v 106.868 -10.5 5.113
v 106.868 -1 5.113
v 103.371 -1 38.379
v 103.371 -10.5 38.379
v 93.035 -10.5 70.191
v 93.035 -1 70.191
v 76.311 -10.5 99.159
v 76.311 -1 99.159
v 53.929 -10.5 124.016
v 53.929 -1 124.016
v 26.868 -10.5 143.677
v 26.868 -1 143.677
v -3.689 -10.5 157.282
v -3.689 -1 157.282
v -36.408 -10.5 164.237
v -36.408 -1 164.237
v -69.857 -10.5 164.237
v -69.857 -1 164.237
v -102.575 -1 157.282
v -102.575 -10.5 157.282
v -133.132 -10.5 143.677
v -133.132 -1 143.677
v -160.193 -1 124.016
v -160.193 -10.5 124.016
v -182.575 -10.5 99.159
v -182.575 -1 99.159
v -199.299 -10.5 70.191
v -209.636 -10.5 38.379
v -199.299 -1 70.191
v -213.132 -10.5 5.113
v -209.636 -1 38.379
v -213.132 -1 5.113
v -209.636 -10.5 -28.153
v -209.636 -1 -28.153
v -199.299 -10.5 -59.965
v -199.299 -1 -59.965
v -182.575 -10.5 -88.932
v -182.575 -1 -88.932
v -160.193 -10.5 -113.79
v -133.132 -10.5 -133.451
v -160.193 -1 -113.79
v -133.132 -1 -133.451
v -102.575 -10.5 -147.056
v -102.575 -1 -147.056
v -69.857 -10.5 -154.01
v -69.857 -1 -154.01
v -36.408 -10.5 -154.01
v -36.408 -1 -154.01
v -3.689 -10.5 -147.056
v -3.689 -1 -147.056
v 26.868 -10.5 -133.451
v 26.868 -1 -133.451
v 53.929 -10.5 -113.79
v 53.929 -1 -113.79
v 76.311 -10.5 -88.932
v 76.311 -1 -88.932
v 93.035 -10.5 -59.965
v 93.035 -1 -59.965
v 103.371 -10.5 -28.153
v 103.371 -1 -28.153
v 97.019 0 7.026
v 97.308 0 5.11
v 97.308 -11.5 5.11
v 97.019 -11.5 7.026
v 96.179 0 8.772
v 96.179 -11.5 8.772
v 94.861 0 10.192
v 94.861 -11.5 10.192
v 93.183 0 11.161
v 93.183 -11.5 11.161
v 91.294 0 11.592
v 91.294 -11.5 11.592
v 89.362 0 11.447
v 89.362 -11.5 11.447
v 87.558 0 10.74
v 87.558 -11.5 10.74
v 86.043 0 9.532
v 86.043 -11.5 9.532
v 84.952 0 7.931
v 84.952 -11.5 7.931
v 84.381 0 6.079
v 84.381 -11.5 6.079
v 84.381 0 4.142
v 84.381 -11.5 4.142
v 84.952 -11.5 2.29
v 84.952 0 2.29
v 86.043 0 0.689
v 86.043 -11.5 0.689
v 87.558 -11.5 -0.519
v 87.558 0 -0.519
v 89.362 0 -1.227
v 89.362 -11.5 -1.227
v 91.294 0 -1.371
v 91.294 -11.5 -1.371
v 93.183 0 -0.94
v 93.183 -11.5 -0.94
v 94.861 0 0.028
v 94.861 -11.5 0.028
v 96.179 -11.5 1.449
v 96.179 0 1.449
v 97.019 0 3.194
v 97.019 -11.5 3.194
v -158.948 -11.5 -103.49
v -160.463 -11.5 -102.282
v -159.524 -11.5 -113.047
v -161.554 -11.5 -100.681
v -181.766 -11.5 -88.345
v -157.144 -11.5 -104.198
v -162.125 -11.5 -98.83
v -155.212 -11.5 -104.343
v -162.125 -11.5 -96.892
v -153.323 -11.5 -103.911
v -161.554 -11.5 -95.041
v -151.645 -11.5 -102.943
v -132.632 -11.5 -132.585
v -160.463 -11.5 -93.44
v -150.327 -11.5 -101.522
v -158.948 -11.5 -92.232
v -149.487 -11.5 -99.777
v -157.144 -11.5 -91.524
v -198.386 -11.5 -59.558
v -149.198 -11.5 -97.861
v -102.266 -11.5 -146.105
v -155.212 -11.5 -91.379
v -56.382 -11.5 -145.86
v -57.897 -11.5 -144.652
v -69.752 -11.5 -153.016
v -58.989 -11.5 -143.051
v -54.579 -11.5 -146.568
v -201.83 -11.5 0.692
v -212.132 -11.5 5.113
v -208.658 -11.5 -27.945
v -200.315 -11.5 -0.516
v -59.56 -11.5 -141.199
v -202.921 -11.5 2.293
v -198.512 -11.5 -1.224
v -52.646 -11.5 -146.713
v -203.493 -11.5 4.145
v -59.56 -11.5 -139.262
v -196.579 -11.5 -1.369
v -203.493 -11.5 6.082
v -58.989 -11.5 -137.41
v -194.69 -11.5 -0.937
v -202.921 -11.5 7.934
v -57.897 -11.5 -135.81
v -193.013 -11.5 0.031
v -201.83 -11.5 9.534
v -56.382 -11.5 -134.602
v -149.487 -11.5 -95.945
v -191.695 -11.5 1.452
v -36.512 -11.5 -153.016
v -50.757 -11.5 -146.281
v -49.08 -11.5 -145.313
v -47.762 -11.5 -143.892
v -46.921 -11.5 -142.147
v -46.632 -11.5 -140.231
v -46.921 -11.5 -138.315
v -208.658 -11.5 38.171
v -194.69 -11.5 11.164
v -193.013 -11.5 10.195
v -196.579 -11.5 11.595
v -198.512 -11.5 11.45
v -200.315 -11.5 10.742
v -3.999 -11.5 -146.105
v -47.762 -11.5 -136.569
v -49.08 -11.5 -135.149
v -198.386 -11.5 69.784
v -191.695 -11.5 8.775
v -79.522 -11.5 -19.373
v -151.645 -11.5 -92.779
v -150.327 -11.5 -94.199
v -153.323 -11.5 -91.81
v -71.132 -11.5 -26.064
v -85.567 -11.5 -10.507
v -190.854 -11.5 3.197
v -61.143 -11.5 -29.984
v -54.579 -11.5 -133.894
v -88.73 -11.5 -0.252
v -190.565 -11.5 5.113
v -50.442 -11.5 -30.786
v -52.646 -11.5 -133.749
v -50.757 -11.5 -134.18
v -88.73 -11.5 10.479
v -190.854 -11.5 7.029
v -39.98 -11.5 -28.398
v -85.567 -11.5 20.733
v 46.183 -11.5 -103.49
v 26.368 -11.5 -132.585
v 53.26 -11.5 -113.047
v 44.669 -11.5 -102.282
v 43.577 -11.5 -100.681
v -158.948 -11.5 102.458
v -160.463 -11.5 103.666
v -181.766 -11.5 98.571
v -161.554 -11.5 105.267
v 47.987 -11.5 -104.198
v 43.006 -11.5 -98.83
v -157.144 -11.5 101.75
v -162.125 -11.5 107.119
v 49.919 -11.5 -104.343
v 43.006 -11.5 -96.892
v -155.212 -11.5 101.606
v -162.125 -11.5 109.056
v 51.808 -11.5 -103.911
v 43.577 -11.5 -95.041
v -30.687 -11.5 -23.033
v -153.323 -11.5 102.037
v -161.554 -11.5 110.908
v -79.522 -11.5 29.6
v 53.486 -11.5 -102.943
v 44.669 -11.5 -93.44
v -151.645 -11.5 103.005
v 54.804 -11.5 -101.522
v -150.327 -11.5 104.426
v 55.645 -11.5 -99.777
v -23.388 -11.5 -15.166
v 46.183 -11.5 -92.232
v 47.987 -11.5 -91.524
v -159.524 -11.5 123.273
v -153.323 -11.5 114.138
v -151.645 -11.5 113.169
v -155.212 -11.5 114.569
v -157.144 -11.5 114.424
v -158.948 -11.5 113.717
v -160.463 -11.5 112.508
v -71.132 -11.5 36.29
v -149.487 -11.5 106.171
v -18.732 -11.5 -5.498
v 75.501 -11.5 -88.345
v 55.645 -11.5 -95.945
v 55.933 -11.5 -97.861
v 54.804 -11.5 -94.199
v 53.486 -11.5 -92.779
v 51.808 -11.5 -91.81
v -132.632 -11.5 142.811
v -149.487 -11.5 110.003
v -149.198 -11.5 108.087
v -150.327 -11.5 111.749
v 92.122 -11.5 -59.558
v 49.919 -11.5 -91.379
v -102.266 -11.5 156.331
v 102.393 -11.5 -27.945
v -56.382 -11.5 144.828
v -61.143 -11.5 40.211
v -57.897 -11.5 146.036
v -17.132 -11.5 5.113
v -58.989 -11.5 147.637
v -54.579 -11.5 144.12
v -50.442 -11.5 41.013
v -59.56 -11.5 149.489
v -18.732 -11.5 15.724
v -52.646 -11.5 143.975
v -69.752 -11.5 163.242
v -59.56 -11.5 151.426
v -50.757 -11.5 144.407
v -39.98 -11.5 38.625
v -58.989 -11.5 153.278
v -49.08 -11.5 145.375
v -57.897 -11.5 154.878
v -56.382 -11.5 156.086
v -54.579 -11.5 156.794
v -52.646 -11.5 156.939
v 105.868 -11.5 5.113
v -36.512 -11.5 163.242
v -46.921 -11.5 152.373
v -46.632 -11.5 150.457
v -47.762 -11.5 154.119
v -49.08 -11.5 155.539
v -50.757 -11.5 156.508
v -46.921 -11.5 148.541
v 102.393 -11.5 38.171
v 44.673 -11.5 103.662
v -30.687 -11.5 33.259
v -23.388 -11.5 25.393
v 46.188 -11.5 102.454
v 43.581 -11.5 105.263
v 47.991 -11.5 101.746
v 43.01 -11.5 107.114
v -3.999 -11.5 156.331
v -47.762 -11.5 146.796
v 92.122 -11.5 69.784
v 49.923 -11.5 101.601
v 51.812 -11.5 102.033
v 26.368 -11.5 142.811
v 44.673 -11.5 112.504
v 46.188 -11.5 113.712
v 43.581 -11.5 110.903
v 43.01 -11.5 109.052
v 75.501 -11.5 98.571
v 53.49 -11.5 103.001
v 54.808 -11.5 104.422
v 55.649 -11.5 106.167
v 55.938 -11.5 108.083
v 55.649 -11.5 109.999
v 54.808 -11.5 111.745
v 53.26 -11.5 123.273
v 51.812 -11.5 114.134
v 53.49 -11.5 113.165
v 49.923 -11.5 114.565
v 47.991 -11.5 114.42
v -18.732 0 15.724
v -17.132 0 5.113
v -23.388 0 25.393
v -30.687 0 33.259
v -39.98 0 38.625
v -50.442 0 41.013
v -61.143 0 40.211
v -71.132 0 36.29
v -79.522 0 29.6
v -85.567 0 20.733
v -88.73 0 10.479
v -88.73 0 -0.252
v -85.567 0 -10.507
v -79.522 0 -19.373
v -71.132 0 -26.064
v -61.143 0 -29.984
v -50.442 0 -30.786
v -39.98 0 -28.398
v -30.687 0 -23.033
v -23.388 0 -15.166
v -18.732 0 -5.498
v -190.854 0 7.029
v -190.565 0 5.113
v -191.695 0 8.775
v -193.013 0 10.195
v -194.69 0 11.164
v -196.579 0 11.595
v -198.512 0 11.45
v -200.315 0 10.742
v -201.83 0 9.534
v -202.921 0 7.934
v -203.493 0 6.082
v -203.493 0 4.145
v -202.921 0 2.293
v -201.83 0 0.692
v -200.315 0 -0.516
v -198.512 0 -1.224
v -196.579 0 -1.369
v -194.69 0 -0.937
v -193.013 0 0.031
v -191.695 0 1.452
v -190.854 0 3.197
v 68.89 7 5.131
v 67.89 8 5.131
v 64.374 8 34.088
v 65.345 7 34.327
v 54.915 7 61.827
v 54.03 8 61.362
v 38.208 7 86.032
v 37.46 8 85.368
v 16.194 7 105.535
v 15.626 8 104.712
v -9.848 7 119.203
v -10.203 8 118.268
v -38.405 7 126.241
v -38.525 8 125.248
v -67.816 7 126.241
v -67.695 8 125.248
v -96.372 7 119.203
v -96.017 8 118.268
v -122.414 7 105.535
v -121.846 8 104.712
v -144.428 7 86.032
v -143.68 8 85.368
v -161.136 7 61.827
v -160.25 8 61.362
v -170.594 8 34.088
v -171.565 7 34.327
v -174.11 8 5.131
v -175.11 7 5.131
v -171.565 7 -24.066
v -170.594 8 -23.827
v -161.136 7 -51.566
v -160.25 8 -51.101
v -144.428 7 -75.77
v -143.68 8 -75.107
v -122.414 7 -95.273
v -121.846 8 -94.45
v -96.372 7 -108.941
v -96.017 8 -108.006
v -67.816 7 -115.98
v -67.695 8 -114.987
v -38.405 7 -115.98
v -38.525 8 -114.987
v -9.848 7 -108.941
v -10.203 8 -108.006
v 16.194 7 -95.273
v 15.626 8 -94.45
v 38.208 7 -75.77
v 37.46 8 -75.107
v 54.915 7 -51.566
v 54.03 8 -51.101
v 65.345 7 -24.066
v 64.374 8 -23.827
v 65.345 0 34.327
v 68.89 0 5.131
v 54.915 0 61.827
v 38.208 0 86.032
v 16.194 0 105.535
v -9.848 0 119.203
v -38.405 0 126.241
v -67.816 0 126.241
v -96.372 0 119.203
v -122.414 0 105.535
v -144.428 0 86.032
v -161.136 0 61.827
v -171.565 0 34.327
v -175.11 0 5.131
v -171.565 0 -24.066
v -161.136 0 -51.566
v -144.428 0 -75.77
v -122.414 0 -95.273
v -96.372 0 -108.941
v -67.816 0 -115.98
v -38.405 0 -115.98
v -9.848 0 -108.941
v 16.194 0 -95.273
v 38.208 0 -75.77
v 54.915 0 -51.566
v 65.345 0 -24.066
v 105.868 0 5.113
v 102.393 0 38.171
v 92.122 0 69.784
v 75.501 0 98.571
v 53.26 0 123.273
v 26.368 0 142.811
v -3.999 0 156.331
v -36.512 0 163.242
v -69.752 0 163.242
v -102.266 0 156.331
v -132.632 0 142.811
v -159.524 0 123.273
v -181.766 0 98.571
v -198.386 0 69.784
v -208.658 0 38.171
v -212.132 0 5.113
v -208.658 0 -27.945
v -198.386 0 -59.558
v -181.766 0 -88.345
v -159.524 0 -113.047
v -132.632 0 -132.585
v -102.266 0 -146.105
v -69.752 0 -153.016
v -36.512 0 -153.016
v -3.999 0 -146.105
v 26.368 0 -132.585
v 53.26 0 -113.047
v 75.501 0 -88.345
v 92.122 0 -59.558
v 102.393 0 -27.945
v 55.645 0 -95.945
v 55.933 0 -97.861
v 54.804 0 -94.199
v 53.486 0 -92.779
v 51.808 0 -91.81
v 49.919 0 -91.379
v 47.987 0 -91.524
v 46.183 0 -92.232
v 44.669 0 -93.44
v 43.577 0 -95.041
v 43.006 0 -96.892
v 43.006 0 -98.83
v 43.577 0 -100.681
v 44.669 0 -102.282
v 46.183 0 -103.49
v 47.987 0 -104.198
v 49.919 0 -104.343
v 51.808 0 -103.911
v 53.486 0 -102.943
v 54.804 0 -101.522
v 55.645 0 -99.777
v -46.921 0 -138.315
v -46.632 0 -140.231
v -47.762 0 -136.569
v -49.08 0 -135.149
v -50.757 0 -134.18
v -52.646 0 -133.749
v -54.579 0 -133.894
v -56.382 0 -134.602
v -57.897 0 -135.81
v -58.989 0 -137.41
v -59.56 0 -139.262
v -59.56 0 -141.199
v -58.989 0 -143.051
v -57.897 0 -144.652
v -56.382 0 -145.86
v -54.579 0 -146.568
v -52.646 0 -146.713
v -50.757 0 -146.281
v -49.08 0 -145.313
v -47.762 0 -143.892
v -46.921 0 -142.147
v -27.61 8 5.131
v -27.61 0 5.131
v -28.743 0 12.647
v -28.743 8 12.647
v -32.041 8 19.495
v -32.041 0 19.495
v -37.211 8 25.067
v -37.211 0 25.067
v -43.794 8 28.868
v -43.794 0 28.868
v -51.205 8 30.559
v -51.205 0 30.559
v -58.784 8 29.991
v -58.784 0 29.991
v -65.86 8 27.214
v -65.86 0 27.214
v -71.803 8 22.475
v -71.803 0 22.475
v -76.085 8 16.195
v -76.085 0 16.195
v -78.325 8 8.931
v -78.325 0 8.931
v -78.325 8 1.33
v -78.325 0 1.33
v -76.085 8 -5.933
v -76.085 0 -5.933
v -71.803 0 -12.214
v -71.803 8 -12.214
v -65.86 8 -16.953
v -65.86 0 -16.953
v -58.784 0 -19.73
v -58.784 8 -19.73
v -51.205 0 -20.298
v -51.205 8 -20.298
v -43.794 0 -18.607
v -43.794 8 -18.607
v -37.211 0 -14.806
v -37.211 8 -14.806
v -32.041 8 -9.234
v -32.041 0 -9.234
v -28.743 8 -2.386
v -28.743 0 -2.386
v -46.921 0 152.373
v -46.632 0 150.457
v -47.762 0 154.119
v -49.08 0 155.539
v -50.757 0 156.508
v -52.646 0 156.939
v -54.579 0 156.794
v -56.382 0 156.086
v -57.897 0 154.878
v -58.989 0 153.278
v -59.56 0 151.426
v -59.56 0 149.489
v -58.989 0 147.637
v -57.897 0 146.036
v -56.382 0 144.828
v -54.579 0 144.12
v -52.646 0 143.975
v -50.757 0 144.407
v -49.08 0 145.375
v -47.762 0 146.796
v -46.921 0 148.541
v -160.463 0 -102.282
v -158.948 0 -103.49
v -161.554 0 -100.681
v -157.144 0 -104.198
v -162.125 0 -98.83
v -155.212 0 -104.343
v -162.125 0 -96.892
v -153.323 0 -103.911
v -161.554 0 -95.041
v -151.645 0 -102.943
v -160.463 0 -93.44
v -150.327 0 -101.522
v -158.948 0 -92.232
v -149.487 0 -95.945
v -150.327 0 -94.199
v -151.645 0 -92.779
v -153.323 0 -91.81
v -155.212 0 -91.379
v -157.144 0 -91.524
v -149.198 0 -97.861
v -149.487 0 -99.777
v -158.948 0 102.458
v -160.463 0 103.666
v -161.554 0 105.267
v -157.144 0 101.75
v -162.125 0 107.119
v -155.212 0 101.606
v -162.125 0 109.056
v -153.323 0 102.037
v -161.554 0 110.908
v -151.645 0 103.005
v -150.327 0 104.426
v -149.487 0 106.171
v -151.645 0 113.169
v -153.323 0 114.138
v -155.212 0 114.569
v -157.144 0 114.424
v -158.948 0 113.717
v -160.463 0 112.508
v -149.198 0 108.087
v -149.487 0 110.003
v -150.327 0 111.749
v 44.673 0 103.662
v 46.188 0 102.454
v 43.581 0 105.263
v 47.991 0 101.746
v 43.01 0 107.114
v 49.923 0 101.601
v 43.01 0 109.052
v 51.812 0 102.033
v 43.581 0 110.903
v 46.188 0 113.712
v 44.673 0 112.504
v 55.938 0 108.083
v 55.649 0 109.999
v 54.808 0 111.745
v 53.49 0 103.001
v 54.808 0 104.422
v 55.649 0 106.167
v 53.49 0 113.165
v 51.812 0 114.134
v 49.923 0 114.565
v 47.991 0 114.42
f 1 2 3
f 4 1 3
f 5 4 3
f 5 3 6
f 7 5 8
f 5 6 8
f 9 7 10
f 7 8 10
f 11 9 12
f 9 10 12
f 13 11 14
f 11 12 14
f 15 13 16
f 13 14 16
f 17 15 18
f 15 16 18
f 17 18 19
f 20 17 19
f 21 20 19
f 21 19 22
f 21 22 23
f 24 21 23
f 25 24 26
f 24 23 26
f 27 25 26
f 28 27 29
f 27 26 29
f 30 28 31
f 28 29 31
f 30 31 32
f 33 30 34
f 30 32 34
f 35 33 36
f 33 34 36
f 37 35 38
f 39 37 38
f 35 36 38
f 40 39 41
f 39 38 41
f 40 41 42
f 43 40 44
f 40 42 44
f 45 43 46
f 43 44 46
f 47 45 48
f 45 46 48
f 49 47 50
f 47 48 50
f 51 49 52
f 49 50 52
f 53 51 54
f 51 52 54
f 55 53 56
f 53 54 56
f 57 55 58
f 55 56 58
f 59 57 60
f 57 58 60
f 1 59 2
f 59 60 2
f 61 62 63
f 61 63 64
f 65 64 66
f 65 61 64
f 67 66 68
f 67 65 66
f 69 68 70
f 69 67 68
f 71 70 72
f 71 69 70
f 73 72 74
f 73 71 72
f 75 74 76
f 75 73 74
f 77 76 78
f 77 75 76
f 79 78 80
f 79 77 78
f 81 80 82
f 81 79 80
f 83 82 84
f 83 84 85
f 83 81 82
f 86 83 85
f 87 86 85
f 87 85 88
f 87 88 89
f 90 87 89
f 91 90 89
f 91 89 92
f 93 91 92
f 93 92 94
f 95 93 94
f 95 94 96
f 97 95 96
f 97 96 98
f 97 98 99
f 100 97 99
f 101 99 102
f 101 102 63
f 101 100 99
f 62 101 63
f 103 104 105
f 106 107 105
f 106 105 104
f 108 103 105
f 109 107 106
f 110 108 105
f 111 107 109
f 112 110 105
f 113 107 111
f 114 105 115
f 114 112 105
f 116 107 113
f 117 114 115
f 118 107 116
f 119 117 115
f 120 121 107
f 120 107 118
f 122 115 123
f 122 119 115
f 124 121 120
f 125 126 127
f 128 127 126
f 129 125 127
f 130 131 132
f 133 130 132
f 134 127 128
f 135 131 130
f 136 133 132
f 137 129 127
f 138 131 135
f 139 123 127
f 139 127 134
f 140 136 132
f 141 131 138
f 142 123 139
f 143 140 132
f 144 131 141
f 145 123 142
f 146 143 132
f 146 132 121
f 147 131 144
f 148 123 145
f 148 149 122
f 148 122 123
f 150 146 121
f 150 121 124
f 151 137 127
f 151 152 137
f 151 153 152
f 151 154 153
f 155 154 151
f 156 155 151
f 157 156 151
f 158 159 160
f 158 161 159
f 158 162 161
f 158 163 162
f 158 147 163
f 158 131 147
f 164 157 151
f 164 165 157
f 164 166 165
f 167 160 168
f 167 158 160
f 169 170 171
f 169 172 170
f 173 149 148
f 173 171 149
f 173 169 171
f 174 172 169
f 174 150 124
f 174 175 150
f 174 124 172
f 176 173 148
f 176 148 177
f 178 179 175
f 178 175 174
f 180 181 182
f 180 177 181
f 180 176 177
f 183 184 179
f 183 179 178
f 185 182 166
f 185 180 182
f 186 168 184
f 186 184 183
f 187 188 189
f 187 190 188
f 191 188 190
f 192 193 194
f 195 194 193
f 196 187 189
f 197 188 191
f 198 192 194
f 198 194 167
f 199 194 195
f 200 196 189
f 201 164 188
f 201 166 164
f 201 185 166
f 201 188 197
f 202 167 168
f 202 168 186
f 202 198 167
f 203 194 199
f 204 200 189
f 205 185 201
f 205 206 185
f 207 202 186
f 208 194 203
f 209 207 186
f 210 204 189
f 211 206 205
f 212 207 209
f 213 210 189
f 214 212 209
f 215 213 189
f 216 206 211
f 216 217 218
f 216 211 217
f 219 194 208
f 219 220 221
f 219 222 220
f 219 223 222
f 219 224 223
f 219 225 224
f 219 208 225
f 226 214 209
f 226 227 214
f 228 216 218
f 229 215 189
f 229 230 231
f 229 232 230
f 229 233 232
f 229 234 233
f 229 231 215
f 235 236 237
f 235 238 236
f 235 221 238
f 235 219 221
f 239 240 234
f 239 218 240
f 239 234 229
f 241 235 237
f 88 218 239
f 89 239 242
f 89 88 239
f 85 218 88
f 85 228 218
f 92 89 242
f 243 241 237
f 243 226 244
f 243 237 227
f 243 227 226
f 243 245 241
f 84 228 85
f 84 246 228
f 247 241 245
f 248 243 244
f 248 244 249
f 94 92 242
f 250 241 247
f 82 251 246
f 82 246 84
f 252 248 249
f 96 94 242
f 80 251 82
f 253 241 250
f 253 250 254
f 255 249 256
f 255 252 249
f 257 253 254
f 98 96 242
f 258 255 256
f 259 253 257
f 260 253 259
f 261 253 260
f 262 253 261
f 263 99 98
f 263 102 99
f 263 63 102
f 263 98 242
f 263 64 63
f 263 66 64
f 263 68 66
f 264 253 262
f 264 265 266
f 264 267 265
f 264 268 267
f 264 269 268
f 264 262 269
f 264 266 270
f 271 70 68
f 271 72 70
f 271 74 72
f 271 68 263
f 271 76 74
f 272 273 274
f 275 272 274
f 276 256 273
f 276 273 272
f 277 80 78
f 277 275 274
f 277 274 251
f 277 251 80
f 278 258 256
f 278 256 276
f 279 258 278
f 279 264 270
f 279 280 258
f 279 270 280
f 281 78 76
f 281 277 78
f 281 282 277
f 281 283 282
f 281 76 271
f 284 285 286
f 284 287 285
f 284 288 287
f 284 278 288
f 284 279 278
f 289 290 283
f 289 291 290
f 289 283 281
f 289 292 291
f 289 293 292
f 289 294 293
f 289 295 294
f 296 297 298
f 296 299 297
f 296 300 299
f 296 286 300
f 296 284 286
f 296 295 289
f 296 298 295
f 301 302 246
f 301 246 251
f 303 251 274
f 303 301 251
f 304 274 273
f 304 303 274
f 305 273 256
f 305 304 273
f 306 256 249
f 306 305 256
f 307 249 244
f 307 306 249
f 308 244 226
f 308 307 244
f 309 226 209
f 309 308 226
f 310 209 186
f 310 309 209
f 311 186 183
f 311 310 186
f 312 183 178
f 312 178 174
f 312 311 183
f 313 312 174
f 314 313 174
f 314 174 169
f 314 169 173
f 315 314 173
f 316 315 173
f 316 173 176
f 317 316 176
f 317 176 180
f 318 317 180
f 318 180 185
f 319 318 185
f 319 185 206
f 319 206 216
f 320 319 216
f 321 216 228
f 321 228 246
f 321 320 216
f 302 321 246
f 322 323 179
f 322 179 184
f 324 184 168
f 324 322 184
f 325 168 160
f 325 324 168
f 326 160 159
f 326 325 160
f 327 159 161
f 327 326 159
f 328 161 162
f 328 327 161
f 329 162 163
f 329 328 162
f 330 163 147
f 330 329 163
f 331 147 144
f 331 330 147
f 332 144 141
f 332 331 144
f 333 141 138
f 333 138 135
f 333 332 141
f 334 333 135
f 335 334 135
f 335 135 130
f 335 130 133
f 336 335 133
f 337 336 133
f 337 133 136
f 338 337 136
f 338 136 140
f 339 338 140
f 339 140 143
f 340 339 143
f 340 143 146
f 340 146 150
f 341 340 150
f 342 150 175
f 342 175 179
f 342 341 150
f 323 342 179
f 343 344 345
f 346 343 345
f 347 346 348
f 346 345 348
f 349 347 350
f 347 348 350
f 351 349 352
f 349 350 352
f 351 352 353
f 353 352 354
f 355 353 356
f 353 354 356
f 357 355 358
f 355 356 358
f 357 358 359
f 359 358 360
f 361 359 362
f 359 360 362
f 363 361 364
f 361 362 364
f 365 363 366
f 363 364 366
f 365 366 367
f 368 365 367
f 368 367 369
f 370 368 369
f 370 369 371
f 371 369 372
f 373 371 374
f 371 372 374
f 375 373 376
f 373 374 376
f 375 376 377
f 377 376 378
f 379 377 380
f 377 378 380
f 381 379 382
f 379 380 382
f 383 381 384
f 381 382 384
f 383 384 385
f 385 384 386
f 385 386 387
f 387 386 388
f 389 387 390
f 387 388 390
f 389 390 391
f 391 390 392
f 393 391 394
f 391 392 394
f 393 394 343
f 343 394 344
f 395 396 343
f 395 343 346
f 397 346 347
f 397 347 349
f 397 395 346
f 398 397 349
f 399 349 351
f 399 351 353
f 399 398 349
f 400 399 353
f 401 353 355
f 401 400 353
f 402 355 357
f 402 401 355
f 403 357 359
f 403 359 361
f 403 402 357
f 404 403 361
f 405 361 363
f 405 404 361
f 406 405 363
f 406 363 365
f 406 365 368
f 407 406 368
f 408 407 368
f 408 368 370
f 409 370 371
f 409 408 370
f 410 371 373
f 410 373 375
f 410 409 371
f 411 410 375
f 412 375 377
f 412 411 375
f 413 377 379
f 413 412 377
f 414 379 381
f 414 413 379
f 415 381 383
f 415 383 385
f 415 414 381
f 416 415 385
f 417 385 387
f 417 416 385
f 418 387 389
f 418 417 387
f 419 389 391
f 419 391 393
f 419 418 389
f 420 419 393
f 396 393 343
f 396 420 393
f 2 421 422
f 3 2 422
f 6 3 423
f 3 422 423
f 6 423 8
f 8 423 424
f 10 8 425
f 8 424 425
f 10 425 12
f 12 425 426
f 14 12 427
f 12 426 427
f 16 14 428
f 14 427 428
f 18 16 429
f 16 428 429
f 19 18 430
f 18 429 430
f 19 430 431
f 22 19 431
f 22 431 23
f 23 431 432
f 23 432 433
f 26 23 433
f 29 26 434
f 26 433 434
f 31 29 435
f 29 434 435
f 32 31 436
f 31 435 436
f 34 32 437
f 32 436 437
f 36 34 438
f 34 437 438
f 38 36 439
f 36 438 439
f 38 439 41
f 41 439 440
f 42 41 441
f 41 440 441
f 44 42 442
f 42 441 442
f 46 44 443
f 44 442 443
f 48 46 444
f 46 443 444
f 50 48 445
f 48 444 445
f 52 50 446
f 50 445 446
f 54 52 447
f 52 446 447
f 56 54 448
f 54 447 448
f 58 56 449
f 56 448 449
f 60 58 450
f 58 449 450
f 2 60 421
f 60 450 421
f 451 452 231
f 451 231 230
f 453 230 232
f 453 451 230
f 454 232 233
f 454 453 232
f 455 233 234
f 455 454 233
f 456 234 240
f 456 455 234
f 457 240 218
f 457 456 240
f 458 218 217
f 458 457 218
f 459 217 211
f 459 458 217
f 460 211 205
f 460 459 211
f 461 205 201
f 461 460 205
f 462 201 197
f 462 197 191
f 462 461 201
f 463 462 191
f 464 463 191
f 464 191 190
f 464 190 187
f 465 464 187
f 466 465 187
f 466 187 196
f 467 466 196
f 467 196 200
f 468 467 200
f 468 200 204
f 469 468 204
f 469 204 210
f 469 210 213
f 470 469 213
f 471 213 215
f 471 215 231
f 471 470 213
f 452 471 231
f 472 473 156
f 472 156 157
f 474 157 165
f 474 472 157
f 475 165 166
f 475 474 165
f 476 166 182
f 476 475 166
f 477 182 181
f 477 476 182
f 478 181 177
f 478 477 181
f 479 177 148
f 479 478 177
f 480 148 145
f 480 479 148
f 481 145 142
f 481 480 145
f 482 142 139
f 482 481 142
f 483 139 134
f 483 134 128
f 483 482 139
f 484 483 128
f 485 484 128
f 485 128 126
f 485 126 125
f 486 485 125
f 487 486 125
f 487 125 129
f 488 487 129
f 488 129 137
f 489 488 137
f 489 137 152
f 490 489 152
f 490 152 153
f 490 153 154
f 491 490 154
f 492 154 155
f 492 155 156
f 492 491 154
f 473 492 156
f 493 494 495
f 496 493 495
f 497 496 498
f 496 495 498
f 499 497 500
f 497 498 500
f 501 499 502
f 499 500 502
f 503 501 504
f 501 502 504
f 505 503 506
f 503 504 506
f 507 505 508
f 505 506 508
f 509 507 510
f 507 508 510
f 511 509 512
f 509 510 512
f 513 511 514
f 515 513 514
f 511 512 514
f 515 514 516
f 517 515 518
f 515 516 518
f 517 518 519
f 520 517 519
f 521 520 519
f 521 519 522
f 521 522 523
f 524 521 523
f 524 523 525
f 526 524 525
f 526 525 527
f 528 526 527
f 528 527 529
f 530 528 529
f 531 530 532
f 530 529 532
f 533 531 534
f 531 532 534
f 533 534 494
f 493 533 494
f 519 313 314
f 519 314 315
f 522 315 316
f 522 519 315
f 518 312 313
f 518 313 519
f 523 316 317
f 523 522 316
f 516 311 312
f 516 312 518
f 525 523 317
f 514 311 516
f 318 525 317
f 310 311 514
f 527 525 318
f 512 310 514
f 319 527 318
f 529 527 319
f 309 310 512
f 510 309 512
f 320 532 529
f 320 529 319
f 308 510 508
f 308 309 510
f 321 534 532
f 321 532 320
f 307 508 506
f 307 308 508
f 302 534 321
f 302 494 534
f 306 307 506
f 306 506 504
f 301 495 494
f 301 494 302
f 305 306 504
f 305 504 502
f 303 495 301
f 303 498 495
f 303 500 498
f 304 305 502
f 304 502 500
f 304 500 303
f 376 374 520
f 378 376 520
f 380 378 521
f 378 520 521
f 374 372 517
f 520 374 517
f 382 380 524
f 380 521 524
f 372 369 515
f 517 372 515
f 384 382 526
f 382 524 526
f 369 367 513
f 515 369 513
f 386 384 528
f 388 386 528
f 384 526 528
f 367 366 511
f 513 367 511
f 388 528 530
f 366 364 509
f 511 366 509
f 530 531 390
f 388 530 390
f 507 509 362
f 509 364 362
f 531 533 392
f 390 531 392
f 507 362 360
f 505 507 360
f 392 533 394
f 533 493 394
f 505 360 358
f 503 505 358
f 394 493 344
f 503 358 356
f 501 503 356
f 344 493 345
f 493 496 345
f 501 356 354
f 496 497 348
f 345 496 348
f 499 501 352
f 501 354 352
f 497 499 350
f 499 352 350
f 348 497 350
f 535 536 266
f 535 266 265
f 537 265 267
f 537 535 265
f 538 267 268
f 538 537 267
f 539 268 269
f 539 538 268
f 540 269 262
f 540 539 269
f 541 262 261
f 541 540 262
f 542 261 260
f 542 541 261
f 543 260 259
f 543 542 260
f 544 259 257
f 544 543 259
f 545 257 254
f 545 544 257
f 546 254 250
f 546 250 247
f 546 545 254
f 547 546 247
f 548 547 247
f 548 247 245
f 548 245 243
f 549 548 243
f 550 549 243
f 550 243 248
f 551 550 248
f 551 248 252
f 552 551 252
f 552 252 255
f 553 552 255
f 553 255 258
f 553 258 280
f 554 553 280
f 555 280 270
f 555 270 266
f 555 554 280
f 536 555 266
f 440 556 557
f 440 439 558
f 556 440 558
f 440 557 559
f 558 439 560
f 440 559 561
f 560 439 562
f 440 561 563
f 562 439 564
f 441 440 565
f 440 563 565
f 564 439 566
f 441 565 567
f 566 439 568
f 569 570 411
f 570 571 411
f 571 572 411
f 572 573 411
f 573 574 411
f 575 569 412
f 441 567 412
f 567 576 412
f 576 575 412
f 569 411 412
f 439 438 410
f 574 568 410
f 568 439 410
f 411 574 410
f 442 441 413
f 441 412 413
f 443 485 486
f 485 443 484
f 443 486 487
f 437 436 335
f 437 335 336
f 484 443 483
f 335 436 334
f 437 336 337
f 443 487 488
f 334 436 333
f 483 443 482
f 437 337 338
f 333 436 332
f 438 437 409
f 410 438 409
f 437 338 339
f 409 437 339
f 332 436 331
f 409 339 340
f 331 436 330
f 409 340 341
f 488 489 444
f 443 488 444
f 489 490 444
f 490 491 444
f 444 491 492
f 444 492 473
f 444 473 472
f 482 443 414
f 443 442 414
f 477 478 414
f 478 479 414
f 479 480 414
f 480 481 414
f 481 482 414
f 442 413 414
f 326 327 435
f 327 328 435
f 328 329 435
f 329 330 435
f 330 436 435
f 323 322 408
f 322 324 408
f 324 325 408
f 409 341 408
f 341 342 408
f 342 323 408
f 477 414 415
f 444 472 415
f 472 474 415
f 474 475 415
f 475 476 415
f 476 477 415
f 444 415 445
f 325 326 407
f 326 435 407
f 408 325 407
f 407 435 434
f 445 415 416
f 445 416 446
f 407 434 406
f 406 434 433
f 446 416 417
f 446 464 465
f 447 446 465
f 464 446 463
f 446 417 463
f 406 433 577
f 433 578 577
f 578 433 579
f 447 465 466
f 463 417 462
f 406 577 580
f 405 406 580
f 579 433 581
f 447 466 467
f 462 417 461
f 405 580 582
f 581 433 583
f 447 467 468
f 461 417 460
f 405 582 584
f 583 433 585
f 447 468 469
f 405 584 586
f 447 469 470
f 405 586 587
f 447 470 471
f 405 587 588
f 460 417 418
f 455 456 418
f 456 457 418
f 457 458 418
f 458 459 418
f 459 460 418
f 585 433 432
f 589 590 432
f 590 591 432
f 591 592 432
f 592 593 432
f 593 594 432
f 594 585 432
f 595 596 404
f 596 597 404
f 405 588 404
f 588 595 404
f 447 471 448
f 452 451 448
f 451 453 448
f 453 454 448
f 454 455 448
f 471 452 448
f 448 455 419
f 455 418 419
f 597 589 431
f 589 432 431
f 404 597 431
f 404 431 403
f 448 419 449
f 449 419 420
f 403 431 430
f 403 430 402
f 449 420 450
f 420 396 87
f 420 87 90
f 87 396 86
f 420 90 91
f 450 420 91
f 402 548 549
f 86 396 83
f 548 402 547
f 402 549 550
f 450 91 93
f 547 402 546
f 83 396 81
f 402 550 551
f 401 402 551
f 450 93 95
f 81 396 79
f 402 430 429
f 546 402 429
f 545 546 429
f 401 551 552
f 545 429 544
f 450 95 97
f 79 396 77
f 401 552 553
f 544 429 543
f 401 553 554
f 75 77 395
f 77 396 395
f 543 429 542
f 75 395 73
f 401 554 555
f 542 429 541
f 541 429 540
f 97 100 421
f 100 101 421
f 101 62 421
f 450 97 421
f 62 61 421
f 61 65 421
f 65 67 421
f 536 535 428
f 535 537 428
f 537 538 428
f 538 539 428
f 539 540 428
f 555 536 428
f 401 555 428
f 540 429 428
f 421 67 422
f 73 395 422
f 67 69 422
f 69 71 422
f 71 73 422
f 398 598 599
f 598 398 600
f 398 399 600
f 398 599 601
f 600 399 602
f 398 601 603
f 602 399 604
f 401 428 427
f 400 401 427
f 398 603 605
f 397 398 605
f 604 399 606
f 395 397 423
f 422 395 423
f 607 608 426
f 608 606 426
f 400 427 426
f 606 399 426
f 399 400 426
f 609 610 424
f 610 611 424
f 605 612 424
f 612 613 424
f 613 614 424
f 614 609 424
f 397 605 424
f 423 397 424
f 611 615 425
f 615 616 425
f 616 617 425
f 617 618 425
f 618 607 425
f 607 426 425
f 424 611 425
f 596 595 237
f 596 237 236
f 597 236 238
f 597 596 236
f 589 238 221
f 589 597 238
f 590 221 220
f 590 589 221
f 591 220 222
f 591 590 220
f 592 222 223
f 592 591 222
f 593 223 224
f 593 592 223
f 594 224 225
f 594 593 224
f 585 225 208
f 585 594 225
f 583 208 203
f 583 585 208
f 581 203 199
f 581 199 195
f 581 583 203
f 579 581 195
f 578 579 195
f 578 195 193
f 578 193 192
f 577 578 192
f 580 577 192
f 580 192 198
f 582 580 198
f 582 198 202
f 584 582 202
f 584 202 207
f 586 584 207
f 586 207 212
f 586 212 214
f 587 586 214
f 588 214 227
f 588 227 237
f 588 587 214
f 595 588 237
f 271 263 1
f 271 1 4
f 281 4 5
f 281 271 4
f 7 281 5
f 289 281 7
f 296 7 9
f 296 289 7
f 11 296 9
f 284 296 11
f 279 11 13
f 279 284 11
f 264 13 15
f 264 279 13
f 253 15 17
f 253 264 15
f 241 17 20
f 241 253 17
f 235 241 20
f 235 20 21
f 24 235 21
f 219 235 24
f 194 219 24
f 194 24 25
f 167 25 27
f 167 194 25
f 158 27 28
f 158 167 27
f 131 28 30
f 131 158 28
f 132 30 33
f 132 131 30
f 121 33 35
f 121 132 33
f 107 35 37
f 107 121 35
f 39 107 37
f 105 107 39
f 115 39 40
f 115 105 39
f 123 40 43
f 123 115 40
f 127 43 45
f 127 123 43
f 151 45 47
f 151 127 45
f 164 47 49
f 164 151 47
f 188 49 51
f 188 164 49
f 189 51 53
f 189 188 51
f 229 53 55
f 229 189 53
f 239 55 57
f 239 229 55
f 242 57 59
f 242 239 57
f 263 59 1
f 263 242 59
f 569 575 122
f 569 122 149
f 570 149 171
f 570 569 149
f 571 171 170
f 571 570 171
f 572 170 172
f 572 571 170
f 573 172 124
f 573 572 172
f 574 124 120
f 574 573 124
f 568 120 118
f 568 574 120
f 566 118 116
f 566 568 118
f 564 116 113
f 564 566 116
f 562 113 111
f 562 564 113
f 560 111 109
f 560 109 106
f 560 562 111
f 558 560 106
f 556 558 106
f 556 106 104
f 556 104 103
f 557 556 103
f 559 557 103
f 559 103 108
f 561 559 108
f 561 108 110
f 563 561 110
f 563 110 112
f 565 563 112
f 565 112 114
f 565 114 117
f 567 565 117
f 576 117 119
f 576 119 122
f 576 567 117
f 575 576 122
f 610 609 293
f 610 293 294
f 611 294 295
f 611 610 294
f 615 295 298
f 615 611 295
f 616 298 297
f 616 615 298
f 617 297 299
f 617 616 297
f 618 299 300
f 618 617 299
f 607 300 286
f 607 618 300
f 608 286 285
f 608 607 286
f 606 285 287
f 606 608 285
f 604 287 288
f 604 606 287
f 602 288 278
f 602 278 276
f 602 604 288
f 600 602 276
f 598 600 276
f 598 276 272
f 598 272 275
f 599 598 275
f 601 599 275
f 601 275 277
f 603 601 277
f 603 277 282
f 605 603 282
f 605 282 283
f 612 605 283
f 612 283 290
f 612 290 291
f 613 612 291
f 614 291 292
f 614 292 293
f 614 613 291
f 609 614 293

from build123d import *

# Parameters (mm, degrees)
F0_R     = 160
F0_R_2   = 6.5
F0_R_3   = 36
F1_DEPTH = 11.5
F2_SIZE  = 1
F3_R     = 122
F3_R_2   = 36
F3_R_3   = 25.5
F4_DEPTH = 8
F5_SIZE  = 1


with BuildPart() as f1:
    # F0 (on Front) → F1 (new body)
    with BuildSketch(Plane.XZ):
        with Locations((-53.132202721, 5.1132893958)):
            Circle(F0_R)
        with Locations((-155.6978265414, -97.8607830485)):
            Circle(F0_R_2, mode=Mode.SUBTRACT)
        with Locations((-53.132202721, -140.2307106042)):
            Circle(F0_R_2, mode=Mode.SUBTRACT)
        with Locations((49.4334210995, -97.8607830485)):
            Circle(F0_R_2, mode=Mode.SUBTRACT)
        with Locations((90.8079806329, 5.1103962891)):
            Circle(F0_R_2, mode=Mode.SUBTRACT)
        with Locations((-197.0651851107, 5.1132893958)):
            Circle(F0_R_2, mode=Mode.SUBTRACT)
        with Locations((-155.6978265414, 108.08736184)):
            Circle(F0_R_2, mode=Mode.SUBTRACT)
        with Locations((-53.132202721, 5.1132893958)):
            Circle(F0_R_3, mode=Mode.SUBTRACT)
        with Locations((-53.132202721, 150.4572893958)):
            Circle(F0_R_2, mode=Mode.SUBTRACT)
        with Locations((49.4375604441, 108.0832387485)):
            Circle(F0_R_2, mode=Mode.SUBTRACT)
    extrude(amount=F1_DEPTH)

    # F2
    f2_edges = [f1.edges().sort_by_distance(p)[0] for p in [
        (-213.132203, 0, 5.113289),
        (-213.132203, -11.5, 5.113289),
    ]]
    chamfer(f2_edges, length=F2_SIZE)

    # F3 (on face) → F4 (join)
    with BuildSketch(Plane.XZ):
        with Locations((-53.1101636589, 5.1305745728)):
            Circle(F3_R)
        with Locations((-53.132202721, 5.1132893958)):
            Circle(F3_R_2, mode=Mode.SUBTRACT)
        with Locations((-53.132202721, 5.1132893958)):
            Circle(F3_R_2)
        with Locations((-53.1101636589, 5.1305745728)):
            Circle(F3_R_3, mode=Mode.SUBTRACT)
    extrude(amount=-F4_DEPTH)

    # F5
    f5_edges = [f1.edges().sort_by_distance(p)[0] for p in [
        (-175.110164, 8, 5.130575),
    ]]
    chamfer(f5_edges, length=F5_SIZE)


solid = f1.part
